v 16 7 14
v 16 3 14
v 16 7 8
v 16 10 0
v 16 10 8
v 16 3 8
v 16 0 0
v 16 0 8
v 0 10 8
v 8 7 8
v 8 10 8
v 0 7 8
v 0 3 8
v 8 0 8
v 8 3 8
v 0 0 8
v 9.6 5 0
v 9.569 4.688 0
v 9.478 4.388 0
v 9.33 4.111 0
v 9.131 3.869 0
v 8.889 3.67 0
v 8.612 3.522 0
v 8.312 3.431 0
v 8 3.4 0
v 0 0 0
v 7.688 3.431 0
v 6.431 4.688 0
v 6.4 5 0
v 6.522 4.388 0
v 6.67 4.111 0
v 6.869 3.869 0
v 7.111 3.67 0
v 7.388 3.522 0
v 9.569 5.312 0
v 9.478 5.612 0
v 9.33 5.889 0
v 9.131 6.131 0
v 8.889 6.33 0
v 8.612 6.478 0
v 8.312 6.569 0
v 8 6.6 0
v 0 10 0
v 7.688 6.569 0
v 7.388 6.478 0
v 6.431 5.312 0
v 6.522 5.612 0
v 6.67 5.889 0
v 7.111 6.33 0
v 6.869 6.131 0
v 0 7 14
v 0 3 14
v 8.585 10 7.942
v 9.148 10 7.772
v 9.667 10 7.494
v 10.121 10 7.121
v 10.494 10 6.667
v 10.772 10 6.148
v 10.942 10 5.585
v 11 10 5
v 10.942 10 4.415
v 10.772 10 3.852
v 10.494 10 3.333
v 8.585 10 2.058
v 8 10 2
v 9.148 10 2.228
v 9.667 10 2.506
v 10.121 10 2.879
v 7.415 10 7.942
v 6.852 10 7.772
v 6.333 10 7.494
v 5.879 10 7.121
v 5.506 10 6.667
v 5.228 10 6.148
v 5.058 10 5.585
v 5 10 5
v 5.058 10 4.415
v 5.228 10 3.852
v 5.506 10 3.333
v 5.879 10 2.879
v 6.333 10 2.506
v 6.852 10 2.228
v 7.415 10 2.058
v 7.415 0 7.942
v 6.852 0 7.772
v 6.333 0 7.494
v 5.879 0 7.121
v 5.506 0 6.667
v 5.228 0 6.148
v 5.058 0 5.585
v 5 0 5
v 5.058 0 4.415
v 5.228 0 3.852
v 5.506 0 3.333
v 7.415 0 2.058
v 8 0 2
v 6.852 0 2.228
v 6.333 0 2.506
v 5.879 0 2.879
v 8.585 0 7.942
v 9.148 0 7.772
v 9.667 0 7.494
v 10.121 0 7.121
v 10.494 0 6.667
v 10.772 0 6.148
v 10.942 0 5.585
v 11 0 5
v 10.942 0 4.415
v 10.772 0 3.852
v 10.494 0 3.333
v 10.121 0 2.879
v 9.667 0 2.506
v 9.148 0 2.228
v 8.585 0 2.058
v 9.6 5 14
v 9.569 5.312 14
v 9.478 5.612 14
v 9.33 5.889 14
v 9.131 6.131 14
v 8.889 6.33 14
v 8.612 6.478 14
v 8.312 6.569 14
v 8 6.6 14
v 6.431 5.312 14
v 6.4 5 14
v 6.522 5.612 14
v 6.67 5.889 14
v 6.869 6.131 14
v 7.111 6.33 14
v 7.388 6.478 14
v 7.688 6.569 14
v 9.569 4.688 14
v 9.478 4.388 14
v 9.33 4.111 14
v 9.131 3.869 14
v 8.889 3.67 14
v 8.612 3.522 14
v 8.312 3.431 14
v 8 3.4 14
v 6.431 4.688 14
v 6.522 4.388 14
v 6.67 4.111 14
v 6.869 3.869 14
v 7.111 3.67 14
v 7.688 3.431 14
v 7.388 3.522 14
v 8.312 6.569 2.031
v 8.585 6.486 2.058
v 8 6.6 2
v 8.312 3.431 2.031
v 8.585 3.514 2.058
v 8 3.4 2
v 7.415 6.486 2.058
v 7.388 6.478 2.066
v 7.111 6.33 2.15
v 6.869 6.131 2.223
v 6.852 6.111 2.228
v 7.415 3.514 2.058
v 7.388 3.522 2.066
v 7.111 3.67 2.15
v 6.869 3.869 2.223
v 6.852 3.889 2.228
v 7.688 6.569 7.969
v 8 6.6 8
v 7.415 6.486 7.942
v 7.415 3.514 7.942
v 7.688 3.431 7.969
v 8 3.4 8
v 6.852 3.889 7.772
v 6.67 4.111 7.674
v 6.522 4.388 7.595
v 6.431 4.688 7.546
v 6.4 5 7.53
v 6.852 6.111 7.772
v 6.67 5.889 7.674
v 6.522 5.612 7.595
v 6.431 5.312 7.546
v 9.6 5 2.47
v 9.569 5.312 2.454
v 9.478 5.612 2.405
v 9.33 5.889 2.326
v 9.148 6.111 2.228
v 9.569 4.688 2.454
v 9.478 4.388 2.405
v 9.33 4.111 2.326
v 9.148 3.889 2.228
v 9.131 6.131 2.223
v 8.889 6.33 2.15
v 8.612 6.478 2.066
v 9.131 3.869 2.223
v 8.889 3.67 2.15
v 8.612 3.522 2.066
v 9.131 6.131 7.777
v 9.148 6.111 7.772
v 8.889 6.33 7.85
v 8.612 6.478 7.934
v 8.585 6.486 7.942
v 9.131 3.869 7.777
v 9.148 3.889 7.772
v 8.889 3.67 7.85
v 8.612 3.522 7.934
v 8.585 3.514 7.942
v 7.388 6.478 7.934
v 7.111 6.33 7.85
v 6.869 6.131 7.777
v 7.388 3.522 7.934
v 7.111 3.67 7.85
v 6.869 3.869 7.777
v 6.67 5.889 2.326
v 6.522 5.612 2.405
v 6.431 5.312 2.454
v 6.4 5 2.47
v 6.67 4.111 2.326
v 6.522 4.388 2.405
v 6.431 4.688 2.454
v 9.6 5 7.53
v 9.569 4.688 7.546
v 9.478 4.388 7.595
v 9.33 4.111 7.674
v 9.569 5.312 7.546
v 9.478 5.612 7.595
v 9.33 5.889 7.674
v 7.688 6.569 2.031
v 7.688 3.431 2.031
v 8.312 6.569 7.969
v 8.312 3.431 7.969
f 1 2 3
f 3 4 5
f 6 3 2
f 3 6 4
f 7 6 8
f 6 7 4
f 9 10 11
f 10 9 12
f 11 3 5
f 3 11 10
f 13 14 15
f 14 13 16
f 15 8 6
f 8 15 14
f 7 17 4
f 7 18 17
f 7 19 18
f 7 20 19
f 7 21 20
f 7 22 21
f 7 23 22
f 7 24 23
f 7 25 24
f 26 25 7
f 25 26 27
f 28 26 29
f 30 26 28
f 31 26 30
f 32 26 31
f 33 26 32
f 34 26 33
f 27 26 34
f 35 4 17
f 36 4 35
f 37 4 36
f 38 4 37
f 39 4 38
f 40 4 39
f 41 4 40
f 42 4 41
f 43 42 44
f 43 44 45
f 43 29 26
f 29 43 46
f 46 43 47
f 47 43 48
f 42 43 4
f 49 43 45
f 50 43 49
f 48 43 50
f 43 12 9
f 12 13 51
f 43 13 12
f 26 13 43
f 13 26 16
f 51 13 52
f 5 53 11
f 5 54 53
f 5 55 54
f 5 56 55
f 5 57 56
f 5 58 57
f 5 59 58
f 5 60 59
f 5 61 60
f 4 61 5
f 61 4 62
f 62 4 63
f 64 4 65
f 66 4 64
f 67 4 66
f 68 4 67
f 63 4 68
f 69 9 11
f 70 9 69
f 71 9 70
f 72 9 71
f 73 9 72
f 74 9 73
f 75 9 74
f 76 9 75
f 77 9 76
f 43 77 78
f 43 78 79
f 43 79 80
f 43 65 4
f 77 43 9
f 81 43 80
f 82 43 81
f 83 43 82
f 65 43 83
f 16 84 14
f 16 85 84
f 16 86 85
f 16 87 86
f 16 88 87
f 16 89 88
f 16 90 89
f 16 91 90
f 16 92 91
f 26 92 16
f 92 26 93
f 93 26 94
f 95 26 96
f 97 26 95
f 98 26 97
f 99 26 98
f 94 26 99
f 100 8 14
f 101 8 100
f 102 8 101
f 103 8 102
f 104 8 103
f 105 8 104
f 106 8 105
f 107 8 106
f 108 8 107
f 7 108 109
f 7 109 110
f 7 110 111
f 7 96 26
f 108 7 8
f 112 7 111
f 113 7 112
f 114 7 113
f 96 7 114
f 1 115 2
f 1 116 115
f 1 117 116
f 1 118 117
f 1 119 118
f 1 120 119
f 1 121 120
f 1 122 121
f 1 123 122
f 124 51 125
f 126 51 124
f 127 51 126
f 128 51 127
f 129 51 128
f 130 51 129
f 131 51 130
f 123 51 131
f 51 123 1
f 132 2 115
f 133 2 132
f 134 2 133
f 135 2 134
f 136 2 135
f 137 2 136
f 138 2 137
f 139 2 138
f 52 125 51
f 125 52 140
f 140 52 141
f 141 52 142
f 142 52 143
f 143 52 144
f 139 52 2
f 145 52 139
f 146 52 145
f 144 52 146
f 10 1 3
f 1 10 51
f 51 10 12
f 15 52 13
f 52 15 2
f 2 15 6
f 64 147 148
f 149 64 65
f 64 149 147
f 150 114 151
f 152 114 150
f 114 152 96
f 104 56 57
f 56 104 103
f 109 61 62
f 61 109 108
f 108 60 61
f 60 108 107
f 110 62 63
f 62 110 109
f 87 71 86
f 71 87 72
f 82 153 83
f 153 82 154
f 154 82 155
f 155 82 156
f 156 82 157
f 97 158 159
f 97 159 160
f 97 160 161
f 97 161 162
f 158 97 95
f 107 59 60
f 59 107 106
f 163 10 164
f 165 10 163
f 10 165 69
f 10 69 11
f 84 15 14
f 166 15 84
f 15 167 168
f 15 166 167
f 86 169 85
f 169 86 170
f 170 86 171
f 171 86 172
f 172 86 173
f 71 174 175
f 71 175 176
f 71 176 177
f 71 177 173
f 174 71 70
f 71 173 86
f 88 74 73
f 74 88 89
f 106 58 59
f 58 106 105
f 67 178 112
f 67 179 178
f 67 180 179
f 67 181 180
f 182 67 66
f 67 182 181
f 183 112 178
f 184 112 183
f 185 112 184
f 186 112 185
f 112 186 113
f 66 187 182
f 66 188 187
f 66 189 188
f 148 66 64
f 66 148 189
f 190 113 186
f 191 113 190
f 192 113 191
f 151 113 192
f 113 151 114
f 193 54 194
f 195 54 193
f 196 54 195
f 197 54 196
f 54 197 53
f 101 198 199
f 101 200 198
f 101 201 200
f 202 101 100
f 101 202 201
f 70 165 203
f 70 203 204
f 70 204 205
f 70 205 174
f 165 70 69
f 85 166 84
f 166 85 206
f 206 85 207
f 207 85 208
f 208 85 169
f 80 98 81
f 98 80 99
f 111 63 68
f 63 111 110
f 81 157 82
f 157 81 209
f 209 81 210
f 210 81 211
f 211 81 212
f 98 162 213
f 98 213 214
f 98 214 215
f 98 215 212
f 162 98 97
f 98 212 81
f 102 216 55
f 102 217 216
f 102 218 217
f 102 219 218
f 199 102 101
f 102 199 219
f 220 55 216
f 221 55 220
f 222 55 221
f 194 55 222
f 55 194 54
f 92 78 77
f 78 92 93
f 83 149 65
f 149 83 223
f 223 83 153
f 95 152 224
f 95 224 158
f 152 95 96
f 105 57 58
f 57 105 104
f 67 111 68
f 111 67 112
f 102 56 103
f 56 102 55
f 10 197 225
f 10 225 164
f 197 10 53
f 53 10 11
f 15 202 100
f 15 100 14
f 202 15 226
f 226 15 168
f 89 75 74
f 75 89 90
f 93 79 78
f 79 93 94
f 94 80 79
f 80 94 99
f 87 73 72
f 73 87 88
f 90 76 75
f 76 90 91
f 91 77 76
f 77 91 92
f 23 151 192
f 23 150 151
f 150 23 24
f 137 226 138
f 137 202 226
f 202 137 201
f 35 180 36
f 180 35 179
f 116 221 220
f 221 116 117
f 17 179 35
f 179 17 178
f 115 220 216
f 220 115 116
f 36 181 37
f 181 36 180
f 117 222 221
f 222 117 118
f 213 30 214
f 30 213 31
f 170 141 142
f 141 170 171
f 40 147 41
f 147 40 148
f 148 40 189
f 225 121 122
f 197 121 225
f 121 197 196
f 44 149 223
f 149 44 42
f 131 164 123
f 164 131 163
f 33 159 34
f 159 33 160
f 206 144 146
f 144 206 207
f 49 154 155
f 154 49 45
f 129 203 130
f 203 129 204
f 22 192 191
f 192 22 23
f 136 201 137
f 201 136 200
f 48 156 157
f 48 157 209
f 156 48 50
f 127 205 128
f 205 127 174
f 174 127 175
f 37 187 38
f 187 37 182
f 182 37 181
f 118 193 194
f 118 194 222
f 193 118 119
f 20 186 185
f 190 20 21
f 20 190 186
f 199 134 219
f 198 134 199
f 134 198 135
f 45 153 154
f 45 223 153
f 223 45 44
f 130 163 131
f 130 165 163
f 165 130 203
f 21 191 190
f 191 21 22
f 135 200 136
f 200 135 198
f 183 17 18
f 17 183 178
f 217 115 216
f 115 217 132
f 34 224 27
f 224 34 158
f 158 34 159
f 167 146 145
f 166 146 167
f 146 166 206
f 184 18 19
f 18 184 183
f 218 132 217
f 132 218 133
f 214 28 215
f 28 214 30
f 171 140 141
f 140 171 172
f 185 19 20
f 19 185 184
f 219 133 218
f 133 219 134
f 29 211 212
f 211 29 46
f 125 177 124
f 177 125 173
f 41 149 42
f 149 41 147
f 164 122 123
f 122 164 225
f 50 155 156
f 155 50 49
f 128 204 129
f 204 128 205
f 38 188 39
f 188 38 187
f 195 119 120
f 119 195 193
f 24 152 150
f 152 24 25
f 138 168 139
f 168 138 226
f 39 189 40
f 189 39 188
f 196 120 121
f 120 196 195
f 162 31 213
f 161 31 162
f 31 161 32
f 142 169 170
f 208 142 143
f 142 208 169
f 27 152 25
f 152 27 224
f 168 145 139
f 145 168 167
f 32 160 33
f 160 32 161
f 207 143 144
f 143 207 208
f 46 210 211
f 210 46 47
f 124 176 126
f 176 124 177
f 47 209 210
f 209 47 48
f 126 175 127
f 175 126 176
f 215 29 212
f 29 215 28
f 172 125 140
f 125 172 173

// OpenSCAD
// Cable clip — print 4–6, screw or glue to chassis rails

$fn = 32;

difference() {
  union() {
    cube([16, 10, 8]);
    translate([0, 3, 8]) cube([16, 4, 6]);
  }
  translate([8, -1, 5]) rotate([-90, 0, 0]) cylinder(h=12, d=6);
  translate([8, 5, -1]) cylinder(h=20, d=3.2);
}
